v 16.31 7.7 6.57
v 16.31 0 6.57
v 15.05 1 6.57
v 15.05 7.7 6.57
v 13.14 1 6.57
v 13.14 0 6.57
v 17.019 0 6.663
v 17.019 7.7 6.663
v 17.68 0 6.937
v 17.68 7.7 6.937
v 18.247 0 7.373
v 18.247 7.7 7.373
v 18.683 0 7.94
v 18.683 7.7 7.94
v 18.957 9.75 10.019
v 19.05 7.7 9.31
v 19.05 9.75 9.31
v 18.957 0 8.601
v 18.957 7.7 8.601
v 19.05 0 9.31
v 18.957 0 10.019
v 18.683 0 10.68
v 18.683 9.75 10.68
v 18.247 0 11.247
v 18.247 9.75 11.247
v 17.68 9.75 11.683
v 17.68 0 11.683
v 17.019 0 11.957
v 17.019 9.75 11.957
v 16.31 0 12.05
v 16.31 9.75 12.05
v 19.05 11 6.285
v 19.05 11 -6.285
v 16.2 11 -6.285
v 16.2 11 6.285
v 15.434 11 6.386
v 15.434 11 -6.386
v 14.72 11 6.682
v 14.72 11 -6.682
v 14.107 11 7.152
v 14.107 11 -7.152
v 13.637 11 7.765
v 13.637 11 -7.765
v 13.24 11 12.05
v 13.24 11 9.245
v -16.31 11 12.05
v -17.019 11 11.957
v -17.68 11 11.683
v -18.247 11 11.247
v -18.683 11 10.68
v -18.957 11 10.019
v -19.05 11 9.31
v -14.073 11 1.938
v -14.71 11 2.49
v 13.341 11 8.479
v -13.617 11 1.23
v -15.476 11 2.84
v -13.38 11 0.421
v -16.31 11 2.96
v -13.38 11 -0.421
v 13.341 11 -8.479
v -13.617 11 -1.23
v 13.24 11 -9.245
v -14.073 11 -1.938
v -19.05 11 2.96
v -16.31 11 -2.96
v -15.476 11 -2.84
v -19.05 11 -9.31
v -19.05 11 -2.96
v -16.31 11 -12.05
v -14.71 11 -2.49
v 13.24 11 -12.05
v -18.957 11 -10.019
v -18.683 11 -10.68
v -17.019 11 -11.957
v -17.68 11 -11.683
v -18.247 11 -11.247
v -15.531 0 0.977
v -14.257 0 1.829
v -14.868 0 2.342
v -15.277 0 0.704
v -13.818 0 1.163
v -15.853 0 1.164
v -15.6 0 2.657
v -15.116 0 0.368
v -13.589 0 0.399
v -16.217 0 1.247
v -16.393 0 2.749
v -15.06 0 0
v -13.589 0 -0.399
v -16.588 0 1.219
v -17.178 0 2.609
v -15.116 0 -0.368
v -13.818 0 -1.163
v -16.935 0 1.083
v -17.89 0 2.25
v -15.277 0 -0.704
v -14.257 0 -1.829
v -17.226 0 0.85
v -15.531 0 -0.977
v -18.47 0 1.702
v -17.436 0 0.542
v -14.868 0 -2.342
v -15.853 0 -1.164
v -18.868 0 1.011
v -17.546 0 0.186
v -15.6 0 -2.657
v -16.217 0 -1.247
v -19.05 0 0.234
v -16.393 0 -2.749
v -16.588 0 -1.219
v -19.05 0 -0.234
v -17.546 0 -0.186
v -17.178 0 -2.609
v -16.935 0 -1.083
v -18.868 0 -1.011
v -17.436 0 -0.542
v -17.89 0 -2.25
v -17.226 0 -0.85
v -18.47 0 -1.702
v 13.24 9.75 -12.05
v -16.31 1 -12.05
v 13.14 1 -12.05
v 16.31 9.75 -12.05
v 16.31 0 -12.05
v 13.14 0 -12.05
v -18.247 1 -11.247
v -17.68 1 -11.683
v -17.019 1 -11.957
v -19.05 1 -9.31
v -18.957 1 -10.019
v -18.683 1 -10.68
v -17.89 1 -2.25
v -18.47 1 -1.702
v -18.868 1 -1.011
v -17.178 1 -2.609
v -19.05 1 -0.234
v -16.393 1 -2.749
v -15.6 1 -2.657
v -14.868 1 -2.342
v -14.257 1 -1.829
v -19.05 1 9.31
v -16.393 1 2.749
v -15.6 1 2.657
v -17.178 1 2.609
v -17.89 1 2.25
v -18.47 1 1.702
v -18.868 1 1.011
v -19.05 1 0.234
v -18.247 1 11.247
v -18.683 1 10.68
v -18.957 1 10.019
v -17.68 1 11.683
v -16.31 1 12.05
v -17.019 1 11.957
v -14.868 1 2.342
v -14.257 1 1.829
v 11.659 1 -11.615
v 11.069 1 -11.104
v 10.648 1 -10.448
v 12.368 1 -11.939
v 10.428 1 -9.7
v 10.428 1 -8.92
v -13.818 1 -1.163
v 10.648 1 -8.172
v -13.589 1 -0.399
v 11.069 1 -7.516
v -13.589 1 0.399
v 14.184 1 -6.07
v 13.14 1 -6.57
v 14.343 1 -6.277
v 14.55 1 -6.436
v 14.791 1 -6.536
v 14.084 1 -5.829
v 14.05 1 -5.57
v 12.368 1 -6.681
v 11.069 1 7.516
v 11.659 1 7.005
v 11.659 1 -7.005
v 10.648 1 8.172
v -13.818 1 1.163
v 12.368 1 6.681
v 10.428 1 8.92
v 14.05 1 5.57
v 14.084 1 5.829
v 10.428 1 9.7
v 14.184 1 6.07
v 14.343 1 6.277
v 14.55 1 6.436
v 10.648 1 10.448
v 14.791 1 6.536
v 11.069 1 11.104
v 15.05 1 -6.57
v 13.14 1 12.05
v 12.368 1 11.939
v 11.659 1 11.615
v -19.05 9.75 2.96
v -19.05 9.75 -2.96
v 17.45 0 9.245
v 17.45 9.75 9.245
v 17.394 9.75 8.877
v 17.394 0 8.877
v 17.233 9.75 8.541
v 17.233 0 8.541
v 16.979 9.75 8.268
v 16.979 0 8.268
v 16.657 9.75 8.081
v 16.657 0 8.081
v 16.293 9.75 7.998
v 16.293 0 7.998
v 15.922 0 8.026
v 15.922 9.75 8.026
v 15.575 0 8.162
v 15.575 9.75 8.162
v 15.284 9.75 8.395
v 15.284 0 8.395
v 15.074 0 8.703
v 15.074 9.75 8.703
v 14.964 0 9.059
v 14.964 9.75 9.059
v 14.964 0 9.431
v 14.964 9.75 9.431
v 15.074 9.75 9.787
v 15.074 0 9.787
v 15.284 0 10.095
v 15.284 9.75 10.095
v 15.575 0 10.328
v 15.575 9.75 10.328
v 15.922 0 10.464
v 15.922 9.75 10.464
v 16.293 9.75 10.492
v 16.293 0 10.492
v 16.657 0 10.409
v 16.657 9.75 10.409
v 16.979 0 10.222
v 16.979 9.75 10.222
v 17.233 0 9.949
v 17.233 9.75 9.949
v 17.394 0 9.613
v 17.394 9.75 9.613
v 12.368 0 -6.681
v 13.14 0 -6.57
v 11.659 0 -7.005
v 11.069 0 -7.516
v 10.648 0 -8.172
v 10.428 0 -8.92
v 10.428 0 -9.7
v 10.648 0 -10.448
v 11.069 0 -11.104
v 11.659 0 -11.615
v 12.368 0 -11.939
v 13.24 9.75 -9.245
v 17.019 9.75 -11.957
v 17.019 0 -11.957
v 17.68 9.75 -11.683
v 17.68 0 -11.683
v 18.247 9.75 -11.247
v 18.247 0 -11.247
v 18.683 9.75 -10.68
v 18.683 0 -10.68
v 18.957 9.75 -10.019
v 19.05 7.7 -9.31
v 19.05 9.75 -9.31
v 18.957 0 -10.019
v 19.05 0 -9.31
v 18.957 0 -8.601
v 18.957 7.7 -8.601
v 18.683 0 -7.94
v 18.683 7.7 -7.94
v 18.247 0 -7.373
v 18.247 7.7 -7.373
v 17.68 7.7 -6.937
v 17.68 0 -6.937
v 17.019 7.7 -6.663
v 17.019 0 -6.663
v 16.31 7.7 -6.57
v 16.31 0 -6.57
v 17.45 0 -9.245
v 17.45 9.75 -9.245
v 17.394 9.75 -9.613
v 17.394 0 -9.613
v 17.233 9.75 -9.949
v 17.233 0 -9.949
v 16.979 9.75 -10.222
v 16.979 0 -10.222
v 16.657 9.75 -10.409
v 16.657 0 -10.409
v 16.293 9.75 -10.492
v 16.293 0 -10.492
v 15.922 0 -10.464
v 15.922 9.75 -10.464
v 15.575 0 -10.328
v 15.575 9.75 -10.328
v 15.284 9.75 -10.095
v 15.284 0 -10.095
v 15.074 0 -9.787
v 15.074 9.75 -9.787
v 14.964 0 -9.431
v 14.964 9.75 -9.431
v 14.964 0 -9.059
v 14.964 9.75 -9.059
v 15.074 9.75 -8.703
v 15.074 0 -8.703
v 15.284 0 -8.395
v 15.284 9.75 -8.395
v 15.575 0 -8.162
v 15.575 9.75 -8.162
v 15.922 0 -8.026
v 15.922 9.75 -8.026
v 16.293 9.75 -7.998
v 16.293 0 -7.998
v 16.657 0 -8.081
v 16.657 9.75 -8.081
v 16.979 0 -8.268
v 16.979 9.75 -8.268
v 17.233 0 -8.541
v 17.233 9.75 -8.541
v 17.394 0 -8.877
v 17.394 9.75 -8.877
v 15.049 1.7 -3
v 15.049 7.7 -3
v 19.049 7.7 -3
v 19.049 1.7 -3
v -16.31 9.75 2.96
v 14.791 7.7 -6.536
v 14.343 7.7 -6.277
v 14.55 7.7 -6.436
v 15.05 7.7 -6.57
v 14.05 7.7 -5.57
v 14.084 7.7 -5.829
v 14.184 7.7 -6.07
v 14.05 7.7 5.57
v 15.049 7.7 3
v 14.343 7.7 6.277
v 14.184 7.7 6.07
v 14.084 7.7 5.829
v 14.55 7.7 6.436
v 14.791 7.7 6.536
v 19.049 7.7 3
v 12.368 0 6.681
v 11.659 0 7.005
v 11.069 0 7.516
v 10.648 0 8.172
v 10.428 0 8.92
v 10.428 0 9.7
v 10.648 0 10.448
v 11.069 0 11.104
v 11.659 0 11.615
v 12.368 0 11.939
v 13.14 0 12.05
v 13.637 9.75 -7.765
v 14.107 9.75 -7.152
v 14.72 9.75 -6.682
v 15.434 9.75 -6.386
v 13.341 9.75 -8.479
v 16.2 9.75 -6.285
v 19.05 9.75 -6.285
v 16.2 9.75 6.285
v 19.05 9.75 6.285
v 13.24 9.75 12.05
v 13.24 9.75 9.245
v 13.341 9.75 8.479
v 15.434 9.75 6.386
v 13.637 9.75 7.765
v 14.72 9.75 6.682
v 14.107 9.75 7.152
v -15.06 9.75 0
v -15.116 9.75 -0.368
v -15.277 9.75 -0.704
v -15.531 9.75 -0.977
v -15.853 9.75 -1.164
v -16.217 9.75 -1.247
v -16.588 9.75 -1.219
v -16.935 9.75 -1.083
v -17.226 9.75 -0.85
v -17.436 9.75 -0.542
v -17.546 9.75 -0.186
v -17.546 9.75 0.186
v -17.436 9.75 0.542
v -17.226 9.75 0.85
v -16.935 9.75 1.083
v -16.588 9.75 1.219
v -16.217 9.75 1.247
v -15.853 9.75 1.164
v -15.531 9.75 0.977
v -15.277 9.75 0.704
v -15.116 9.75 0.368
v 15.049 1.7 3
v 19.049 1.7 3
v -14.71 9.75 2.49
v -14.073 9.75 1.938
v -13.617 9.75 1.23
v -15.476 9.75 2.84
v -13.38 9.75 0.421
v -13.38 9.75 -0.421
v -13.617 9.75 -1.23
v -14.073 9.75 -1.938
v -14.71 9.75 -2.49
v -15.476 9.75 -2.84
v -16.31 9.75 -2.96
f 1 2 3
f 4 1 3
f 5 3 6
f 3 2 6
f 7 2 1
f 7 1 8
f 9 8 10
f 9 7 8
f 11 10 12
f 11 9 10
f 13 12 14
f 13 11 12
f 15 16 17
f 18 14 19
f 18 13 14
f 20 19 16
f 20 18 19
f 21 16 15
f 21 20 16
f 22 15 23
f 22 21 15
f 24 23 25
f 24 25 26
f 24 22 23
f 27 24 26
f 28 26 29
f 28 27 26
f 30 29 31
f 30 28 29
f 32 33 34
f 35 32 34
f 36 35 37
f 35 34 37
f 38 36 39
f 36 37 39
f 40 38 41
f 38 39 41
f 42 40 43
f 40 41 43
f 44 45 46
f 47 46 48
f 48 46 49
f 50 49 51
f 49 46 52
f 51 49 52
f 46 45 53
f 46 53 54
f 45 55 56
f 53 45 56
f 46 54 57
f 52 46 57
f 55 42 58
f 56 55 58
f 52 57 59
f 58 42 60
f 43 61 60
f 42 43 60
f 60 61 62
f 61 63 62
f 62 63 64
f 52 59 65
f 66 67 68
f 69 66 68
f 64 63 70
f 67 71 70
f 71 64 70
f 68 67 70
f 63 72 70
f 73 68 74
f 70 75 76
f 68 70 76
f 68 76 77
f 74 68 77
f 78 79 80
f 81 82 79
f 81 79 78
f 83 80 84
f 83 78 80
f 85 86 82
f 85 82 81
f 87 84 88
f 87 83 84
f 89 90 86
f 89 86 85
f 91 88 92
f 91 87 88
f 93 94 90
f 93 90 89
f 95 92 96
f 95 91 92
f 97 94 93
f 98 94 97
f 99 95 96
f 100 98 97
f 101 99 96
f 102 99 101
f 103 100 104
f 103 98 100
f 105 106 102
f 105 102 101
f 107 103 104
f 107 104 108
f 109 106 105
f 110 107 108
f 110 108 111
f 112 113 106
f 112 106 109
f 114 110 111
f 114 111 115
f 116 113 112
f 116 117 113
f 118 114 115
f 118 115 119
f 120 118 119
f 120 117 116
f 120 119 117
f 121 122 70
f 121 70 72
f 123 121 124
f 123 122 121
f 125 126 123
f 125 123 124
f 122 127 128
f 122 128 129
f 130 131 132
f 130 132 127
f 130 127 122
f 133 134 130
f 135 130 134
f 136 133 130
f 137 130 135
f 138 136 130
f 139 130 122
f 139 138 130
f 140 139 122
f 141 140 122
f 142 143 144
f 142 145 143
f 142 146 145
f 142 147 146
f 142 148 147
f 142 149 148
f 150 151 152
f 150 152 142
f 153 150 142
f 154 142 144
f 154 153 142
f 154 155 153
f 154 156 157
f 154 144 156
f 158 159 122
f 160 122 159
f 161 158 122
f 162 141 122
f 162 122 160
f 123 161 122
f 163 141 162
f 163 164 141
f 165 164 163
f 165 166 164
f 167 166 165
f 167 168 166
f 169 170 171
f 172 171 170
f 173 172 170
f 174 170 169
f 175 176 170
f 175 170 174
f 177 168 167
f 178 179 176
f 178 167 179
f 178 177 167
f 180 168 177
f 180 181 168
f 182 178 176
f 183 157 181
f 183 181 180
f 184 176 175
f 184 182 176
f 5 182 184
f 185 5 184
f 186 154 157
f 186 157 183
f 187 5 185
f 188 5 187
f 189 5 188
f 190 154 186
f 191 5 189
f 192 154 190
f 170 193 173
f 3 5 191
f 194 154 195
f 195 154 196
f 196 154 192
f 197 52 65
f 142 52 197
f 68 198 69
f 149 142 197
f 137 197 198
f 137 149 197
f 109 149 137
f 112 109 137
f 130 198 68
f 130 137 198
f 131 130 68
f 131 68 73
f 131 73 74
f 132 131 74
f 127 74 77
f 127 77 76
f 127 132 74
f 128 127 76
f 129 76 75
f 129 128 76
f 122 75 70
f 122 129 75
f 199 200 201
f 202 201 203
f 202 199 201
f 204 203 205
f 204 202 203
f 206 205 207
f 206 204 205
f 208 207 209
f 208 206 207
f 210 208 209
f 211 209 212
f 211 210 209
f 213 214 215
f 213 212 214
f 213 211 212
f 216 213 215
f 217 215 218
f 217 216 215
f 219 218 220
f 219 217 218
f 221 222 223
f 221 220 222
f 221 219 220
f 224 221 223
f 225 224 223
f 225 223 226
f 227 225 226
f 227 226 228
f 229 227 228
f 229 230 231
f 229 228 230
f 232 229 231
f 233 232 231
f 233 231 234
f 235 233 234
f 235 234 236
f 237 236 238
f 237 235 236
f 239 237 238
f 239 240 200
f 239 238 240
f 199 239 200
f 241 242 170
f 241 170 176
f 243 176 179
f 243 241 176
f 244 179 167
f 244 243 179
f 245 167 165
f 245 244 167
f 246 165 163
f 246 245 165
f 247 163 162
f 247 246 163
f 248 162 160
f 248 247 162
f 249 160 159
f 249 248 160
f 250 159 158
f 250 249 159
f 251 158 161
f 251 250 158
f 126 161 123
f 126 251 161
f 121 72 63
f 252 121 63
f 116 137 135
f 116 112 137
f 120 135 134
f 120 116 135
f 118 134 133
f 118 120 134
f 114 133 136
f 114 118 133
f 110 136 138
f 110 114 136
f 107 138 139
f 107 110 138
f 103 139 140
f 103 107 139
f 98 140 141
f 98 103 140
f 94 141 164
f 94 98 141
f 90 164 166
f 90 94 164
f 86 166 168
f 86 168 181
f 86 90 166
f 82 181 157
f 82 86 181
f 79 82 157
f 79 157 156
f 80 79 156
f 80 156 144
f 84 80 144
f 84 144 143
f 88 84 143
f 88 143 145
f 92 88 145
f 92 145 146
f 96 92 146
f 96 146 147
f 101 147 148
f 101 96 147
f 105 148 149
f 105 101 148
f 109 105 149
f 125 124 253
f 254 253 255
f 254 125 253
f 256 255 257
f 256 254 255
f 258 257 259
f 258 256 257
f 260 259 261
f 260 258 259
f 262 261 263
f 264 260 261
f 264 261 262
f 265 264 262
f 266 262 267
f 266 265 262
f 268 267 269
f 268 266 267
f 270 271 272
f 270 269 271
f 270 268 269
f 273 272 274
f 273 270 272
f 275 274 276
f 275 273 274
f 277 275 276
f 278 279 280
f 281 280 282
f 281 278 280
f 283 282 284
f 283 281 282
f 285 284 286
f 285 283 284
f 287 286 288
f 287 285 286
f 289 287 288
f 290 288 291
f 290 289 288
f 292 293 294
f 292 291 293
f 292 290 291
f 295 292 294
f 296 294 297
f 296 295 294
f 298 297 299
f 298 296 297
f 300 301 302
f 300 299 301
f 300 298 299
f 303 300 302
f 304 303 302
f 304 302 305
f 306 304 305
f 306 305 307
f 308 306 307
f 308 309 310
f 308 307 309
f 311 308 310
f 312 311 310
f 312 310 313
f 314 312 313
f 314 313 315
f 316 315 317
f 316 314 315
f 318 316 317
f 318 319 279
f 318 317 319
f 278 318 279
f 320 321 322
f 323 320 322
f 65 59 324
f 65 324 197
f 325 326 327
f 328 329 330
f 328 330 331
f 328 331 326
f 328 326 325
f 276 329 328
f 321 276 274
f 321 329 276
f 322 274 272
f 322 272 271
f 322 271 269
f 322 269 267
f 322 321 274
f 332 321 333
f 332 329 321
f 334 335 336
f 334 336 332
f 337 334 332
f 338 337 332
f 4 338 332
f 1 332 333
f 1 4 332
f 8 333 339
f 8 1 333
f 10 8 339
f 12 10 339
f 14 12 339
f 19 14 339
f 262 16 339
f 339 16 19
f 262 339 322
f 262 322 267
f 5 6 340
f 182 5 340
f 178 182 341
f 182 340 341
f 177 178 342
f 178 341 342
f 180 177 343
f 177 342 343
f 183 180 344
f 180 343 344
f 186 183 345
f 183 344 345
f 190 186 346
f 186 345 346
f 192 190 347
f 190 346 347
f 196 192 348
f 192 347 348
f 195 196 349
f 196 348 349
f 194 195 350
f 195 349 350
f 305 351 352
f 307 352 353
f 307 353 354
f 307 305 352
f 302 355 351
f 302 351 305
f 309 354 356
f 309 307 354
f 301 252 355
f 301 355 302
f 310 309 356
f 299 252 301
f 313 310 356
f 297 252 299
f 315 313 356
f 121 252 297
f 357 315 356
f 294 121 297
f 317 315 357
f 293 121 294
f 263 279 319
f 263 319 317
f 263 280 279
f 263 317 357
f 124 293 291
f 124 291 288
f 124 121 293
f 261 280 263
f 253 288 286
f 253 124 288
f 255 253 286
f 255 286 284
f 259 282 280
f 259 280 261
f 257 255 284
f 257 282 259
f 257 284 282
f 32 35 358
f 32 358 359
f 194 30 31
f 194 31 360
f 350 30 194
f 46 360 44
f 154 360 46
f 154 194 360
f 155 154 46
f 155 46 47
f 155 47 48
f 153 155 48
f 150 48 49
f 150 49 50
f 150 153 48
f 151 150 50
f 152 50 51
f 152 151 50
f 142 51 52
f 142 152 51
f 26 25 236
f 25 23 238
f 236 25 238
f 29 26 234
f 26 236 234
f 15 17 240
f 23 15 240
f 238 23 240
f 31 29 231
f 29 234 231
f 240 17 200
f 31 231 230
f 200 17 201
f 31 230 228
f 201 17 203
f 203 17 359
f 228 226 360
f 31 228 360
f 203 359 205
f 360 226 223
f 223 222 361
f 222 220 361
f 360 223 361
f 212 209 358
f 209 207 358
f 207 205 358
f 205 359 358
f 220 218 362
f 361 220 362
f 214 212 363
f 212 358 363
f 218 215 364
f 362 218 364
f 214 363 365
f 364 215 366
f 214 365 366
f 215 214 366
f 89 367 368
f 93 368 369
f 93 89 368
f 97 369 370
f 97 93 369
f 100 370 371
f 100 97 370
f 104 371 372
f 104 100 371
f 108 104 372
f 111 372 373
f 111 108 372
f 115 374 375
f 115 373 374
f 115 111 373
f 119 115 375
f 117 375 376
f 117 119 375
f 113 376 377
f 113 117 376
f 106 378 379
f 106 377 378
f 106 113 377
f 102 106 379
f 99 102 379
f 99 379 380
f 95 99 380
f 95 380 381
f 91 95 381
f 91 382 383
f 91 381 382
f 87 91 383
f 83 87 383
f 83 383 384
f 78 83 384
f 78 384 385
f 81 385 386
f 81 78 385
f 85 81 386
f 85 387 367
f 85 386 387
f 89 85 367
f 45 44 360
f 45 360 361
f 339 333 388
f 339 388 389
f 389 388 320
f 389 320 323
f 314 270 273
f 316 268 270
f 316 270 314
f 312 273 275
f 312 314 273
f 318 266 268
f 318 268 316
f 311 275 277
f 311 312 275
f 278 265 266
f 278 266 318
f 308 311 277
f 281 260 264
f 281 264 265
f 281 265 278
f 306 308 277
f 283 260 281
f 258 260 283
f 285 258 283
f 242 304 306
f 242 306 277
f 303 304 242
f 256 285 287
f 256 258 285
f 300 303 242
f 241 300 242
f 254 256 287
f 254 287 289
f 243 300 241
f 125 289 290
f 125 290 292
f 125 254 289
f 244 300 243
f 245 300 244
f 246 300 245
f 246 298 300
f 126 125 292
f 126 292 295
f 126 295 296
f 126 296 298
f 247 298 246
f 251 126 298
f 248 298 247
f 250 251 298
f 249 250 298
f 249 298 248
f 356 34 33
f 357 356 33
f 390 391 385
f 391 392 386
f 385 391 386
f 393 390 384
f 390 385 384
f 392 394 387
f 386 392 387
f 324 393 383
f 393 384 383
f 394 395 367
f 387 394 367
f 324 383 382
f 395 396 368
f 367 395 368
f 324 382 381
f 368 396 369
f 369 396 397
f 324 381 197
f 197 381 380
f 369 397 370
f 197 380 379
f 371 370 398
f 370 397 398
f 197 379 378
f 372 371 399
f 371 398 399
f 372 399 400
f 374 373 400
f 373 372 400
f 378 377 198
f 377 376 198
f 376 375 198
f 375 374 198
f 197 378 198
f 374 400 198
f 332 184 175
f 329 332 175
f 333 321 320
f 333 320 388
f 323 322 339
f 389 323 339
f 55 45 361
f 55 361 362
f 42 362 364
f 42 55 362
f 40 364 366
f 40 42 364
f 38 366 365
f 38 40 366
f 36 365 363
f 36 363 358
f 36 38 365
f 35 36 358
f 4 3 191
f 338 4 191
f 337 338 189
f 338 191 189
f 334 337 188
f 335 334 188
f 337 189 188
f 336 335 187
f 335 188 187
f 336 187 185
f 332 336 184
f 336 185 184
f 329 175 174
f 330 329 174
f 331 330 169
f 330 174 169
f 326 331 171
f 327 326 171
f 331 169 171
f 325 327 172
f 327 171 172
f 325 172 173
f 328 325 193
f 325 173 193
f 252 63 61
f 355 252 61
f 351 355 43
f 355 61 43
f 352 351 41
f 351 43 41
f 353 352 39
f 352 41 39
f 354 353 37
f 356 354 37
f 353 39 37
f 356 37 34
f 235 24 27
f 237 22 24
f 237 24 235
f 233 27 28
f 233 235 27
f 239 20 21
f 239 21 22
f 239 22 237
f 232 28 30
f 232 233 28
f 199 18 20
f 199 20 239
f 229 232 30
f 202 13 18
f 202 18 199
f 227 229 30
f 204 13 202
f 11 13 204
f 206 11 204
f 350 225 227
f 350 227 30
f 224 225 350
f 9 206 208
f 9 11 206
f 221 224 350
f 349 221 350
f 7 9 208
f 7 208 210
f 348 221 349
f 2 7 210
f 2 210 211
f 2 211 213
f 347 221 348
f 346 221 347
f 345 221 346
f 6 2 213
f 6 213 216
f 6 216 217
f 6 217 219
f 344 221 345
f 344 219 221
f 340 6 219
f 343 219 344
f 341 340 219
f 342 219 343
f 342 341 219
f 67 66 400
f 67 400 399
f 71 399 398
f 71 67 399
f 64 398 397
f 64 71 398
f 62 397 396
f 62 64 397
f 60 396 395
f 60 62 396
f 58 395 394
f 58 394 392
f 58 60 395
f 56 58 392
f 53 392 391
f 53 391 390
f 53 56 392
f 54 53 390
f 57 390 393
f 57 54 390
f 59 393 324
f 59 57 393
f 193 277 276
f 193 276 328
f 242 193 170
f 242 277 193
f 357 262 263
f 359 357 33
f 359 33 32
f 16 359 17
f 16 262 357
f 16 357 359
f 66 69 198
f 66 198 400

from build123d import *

# Parameters (mm, degrees)
SKIZZE1_R                       = 1.25
AUFSATZ_LINEAR_AUSTRAGEN1_DEPTH = 11
SCHNITT_LINEAR_AUSTRAGEN1_DEPTH = 1.25
SKIZZE3_OUTSIDE_W               = 49.38
SKIZZE3_OUTSIDE_H               = 35.38
SKIZZE3_OUTSIDE_R               = 2.75
SCHNITT_LINEAR_AUSTRAGEN2_DEPTH = 1
SCHNITT_LINEAR_AUSTRAGEN3_DEPTH = 6.7
SKIZZE5_W                       = 4
SKIZZE5_H                       = 6
AUFSATZ_LINEAR_AUSTRAGEN2_DEPTH = 6


with BuildPart() as part:
    # Skizze1 → Aufsatz-Linear austragen1 (new body)
    with BuildSketch(Plane(origin=(0, 0, 0), x_dir=(1, 0, 0), z_dir=(0, 1, 0))):
        with BuildLine():
            Line((-19.05, -9.31), (-19.05, 9.31))
            ThreePointArc((-19.05, 9.31), (-18.24747258, 11.24747258), (-16.31, 12.05))
            Line((-16.31, 12.05), (16.31, 12.05))
            ThreePointArc((16.31, 12.05), (18.24747258, 11.24747258), (19.05, 9.31))
            Line((19.05, 9.31), (19.05, -9.31))
            ThreePointArc((19.05, -9.31), (18.24747258, -11.24747258), (16.31, -12.05))
            Line((16.31, -12.05), (-16.31, -12.05))
            ThreePointArc((-16.31, -12.05), (-18.24747258, -11.24747258), (-19.05, -9.31))
        make_face()
        with Locations((16.2, 9.245)):
            Circle(SKIZZE1_R, mode=Mode.SUBTRACT)
        with Locations((16.2, -9.245)):
            Circle(SKIZZE1_R, mode=Mode.SUBTRACT)
        with Locations((-16.31, 0)):
            Circle(SKIZZE1_R, mode=Mode.SUBTRACT)
    extrude(amount=AUFSATZ_LINEAR_AUSTRAGEN1_DEPTH)

    # Skizze2 → Schnitt-Linear austragen1 (cut)
    with BuildSketch(Plane(origin=(0, 11, 0), x_dir=(1, 0, 0), z_dir=(0, 1, 0))):
        with BuildLine():
            Line((-19.05, -2.96), (-19.05, 2.96))
            Line((-19.05, 2.96), (-16.31, 2.96))
            ThreePointArc((-16.31, 2.96), (-13.35, 0), (-16.31, -2.96))
            Line((-16.31, -2.96), (-19.05, -2.96))
        make_face()
        with BuildLine():
            Line((13.24, 12.05), (13.24, 9.245))
            ThreePointArc((13.24, 9.245), (14.106963928, 7.151963928), (16.2, 6.285))
            Line((16.2, 6.285), (19.05, 6.285))
            Line((19.05, 6.285), (19.05, 12.05))
            Line((19.05, 12.05), (13.24, 12.05))
        make_face()
        with BuildLine():
            Line((19.05, -12.05), (13.24, -12.05))
            Line((13.24, -12.05), (13.24, -9.245))
            ThreePointArc((13.24, -9.245), (14.106963928, -7.151963928), (16.2, -6.285))
            Line((16.2, -6.285), (19.05, -6.285))
            Line((19.05, -6.285), (19.05, -12.05))
        make_face()
    extrude(amount=-SCHNITT_LINEAR_AUSTRAGEN1_DEPTH, mode=Mode.SUBTRACT)

    # Skizze3 outside → Schnitt-Linear austragen2 (cut)
    with BuildSketch(Plane.XZ):
        Rectangle(SKIZZE3_OUTSIDE_W, SKIZZE3_OUTSIDE_H)
        with Locations((-16.31, 0)):
            Circle(SKIZZE3_OUTSIDE_R, mode=Mode.SUBTRACT)
        with BuildLine():
            Line((13.14, 12.05), (16.31, 12.05))
            ThreePointArc((16.31, 12.05), (19.05, 9.31), (16.31, 6.57))
            Line((16.31, 6.57), (13.14, 6.57))
            ThreePointArc((13.14, 6.57), (10.4, 9.31), (13.14, 12.05))
        make_face(mode=Mode.SUBTRACT)
        with BuildLine():
            Line((13.14, -12.05), (16.31, -12.05))
            ThreePointArc((16.31, -12.05), (19.05, -9.31), (16.31, -6.57))
            Line((16.31, -6.57), (13.14, -6.57))
            ThreePointArc((13.14, -6.57), (10.4, -9.31), (13.14, -12.05))
        make_face(mode=Mode.SUBTRACT)
    extrude(amount=-SCHNITT_LINEAR_AUSTRAGEN2_DEPTH, mode=Mode.SUBTRACT)

    # Skizze4 → Schnitt-Linear austragen3 (cut)
    with BuildSketch(Plane.XZ.offset(-1)):
        with BuildLine():
            Line((16.31, 6.57), (15.05, 6.57))
            ThreePointArc((15.05, 6.57), (14.342893219, 6.277106781), (14.05, 5.57))
            Line((14.05, 5.57), (14.05, -5.57))
            ThreePointArc((14.05, -5.57), (14.342893219, -6.277106781), (15.05, -6.57))
            Line((15.05, -6.57), (16.31, -6.57))
            ThreePointArc((16.31, -6.57), (18.24747258, -7.37252742), (19.05, -9.31))
            Line((19.05, -9.31), (19.05, 9.31))
            ThreePointArc((19.05, 9.31), (18.24747258, 7.37252742), (16.31, 6.57))
        make_face()
    extrude(amount=-SCHNITT_LINEAR_AUSTRAGEN3_DEPTH, mode=Mode.SUBTRACT)

    # Skizze5 → Aufsatz-Linear austragen2 (add)
    with BuildSketch(Plane.XZ.offset(-7.7)):
        with Locations((17.049, 0)):
            Rectangle(SKIZZE5_W, SKIZZE5_H)
    extrude(amount=AUFSATZ_LINEAR_AUSTRAGEN2_DEPTH)


solid = part.part
